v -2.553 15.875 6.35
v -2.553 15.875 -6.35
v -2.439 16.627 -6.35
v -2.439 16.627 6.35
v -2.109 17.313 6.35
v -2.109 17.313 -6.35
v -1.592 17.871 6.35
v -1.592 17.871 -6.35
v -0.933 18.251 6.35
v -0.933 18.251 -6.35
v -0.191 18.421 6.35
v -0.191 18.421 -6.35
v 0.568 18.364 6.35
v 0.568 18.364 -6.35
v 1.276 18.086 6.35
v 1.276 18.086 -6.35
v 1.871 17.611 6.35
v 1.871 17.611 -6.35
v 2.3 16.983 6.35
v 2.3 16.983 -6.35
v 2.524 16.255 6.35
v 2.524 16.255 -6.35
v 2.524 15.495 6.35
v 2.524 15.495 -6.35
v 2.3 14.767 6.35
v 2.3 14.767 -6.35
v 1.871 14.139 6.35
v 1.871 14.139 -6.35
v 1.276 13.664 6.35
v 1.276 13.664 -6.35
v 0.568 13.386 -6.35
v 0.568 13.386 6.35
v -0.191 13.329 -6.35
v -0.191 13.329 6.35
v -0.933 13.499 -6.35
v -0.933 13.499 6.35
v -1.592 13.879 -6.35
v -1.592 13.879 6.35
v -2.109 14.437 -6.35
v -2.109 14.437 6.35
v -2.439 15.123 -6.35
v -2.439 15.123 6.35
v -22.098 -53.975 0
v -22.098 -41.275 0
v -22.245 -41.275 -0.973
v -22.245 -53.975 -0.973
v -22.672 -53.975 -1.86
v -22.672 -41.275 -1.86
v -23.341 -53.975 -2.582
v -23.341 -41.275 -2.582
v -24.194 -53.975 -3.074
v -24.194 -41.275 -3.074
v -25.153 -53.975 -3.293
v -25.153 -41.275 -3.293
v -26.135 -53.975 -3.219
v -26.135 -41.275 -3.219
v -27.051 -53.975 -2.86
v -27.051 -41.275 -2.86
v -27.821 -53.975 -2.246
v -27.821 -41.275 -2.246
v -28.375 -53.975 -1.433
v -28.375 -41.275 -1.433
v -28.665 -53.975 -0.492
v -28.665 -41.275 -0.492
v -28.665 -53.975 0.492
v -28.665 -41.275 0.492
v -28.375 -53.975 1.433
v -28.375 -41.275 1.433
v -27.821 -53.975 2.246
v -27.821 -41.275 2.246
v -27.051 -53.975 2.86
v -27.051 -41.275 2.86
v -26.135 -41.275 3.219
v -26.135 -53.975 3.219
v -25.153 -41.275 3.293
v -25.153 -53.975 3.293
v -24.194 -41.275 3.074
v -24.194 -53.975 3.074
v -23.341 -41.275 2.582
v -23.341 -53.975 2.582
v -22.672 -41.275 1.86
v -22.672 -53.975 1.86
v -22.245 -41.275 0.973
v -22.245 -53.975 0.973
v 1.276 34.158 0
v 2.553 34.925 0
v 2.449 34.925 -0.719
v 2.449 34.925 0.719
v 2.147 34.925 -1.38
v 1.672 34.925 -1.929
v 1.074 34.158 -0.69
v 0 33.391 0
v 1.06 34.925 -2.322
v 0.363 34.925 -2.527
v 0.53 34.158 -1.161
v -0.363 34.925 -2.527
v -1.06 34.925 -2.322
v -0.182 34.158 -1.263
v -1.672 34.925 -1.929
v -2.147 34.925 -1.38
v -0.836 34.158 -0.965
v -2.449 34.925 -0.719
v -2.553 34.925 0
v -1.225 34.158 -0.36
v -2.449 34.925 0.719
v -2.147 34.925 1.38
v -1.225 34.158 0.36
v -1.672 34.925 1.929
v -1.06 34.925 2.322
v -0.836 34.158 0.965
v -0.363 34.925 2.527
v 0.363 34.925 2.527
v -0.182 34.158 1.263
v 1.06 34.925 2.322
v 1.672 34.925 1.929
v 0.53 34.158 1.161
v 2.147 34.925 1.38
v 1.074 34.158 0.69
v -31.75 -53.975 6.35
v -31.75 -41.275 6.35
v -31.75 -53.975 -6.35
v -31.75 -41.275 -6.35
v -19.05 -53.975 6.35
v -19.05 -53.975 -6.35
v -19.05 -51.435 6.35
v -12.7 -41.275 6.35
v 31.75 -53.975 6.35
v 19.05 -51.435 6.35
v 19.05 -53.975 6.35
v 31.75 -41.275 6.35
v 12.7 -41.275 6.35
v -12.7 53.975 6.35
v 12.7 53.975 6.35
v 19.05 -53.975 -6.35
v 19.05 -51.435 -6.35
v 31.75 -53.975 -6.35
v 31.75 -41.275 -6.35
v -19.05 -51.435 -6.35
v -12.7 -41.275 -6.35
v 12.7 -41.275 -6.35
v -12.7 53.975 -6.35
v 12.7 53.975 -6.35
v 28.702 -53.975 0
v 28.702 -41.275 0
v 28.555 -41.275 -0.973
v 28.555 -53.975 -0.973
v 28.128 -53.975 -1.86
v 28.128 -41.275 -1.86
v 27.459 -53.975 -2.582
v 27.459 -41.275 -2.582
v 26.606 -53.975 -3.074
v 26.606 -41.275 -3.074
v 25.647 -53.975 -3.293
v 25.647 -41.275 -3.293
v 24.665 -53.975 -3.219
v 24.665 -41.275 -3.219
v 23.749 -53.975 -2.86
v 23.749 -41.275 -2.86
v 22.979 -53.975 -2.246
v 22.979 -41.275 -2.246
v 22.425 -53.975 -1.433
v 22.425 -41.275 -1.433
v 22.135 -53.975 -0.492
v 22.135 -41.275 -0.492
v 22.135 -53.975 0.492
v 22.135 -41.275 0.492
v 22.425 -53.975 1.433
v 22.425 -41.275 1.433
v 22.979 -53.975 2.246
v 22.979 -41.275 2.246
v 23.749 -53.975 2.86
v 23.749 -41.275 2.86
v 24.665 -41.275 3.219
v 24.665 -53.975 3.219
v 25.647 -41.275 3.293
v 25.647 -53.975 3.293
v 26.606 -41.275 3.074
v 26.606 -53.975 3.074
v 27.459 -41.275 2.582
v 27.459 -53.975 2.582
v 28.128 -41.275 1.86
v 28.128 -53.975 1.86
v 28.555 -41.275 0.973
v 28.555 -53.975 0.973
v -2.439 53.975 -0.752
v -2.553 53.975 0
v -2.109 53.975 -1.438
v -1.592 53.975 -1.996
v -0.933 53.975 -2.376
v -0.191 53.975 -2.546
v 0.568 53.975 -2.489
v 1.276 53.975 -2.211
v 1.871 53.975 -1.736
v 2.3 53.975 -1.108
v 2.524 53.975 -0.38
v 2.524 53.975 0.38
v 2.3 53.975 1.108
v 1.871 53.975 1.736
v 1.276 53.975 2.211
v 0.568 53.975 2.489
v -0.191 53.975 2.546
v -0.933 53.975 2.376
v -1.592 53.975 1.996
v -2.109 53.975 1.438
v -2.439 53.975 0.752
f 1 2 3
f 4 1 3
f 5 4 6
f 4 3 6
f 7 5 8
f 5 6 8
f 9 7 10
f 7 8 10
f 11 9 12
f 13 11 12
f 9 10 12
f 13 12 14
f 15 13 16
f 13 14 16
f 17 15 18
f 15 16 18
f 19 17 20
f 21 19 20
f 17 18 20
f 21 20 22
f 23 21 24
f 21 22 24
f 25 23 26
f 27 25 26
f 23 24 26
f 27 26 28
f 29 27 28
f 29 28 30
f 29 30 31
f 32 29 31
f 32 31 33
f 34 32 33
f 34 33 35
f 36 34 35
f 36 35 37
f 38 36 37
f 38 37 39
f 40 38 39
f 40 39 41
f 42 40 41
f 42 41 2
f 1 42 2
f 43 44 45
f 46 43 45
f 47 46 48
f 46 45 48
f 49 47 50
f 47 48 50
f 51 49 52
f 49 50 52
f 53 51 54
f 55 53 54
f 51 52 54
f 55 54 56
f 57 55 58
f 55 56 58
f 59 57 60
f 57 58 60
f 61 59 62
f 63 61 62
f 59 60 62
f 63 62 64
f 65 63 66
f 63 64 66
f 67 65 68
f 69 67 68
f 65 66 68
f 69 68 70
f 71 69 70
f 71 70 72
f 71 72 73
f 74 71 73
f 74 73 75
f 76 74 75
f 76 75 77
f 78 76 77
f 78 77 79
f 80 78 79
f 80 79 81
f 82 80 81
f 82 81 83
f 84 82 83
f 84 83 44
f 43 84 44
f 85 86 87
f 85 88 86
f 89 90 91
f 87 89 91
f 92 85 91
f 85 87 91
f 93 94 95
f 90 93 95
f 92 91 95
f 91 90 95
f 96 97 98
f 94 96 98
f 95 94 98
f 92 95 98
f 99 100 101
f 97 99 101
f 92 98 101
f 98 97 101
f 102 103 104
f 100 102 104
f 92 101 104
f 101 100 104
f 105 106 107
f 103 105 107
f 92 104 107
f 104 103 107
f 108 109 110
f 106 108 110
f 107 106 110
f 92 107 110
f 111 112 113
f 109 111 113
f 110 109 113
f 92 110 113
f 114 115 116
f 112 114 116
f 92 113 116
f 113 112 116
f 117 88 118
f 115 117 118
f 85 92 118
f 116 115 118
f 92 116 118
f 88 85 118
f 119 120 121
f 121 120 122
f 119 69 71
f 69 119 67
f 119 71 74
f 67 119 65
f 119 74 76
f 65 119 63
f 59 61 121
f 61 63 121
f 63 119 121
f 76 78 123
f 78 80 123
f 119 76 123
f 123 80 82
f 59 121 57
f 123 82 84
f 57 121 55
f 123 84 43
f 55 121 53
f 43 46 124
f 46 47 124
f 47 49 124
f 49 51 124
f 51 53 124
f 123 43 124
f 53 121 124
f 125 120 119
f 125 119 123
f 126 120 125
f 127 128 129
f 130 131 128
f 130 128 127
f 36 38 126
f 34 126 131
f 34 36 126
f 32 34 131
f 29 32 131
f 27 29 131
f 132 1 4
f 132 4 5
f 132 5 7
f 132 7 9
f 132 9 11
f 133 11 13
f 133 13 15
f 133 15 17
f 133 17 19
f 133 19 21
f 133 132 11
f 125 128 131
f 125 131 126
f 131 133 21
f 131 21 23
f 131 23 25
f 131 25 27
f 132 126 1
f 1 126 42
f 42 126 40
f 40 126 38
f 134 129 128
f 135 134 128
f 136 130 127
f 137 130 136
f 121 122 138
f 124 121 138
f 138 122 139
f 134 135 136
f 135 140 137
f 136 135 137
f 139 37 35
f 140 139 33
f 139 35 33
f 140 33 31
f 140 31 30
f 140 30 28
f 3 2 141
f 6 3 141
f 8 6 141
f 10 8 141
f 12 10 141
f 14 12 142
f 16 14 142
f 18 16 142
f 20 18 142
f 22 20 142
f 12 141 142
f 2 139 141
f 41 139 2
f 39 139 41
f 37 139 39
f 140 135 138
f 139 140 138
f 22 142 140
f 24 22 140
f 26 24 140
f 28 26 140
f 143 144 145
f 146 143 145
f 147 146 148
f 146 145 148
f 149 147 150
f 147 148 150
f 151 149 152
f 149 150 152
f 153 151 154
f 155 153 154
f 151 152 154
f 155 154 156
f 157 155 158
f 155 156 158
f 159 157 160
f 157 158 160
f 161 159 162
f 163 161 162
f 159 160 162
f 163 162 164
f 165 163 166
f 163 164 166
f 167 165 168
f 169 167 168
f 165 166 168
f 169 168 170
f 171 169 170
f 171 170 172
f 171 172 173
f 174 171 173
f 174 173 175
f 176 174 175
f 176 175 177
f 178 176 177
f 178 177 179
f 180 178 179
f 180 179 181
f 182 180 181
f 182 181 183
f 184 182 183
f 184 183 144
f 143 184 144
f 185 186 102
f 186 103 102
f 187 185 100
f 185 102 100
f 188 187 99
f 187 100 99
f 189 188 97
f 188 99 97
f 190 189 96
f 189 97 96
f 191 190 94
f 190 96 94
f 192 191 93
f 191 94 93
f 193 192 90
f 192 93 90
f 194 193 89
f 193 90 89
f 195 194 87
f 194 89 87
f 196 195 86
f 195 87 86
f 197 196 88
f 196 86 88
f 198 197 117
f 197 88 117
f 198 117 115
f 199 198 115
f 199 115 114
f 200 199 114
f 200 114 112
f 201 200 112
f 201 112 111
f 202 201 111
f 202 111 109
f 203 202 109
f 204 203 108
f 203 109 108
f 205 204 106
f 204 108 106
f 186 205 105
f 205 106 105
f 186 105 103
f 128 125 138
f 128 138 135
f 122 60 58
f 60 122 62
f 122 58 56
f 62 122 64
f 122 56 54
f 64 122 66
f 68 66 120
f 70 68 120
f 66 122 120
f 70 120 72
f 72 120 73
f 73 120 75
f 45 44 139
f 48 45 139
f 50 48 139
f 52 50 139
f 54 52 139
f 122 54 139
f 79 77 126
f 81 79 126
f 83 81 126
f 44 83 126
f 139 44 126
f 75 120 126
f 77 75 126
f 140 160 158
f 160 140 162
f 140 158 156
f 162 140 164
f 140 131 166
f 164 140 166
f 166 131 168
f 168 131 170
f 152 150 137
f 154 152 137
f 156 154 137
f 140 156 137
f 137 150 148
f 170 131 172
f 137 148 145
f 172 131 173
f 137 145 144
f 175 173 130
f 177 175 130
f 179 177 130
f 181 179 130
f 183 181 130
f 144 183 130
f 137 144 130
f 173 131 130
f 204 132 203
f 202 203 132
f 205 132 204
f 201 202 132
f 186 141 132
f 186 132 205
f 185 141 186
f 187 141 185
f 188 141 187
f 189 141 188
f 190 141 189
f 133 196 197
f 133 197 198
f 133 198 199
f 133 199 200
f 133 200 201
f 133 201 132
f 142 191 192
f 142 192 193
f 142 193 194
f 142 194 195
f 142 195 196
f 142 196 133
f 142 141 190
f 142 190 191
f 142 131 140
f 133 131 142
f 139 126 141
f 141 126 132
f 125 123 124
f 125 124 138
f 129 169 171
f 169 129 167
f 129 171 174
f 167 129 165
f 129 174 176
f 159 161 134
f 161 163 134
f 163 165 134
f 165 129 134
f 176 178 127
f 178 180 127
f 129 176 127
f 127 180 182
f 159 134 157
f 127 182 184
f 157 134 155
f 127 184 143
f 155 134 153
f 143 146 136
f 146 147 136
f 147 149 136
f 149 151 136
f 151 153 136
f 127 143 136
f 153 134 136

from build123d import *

# Parameters (mm, degrees)
SKETCH1_W                   = 63.5
SKETCH1_H                   = 12.7
BOSS_EXTRUDE1_DEPTH         = 53.975
CUT_EXTRUDE1_REACH          = 14.7
SKETCH2_W                   = 19.05
SKETCH2_H                   = 95.25
SKETCH3_R                   = 3.302
CUT_EXTRUDE2_DEPTH          = 13.7
F_1_4_20_TAPPED_HOLE1_D     = 5.1054
F_1_4_20_TAPPED_HOLE1_DEPTH = 19.05
F_1_4_20_TAPPED_HOLE1_TIP   = 1.533816902
SKETCH6_W                   = 38.1
SKETCH6_H                   = 2.54
CUT_EXTRUDE3_DEPTH          = 13.7
F_1_4_20_TAPPED_HOLE2_D     = 5.1054
F_1_4_20_TAPPED_HOLE2_DEPTH = 25.4
F_1_4_20_TAPPED_HOLE2_TIP   = 1.533816902


with BuildPart() as part:
    # Sketch1 → Boss-Extrude1 (new body, symmetric)
    with BuildSketch(Plane(origin=(0, 0, 0), x_dir=(1, 0, 0), z_dir=(0, 1, 0))):
        Rectangle(SKETCH1_W, SKETCH1_H)
    extrude(amount=BOSS_EXTRUDE1_DEPTH, both=True)

    # Sketch2 → Cut-Extrude1 (cut, up to next)
    with BuildSketch(Plane.XY.offset(6.35), mode=Mode.PRIVATE) as cut_extrude1_sk1:
        with Locations((-22.225, 6.35)):
            Rectangle(SKETCH2_W, SKETCH2_H)
    cut_extrude1_tool1 = extrude(cut_extrude1_sk1.sketch, amount=-CUT_EXTRUDE1_REACH, mode=Mode.PRIVATE) & part.part
    add(cut_extrude1_tool1.solids().sort_by_distance((-22.225, 6.35, 6.35))[0], mode=Mode.SUBTRACT)
    # Sketch2 → Cut-Extrude1 (cut, up to next)
    with BuildSketch(Plane.XY.offset(6.35), mode=Mode.PRIVATE) as cut_extrude1_sk2:
        with Locations((22.225, 6.35)):
            Rectangle(SKETCH2_W, SKETCH2_H)
    cut_extrude1_tool2 = extrude(cut_extrude1_sk2.sketch, amount=-CUT_EXTRUDE1_REACH, mode=Mode.PRIVATE) & part.part
    add(cut_extrude1_tool2.solids().sort_by_distance((22.225, 6.35, 6.35))[0], mode=Mode.SUBTRACT)

    # Sketch3 → Cut-Extrude2 (cut, through all)
    with BuildSketch(Plane(origin=(0, -41.275, 0), x_dir=(1, 0, 0), z_dir=(0, 1, 0))):
        with Locations((-25.4, 0)):
            Circle(SKETCH3_R)
        with Locations((25.4, 0)):
            Circle(SKETCH3_R)
    extrude(amount=-CUT_EXTRUDE2_DEPTH, mode=Mode.SUBTRACT)

    # 1/4-20 Tapped Hole1
    with Locations(Plane(origin=(0, 53.975, 0), x_dir=(1, 0, 0), z_dir=(0, 1, 0))):
        with Locations((0, 0)):
            Hole(F_1_4_20_TAPPED_HOLE1_D / 2, depth=F_1_4_20_TAPPED_HOLE1_DEPTH)
            with Locations((0, 0, -(F_1_4_20_TAPPED_HOLE1_DEPTH + F_1_4_20_TAPPED_HOLE1_TIP / 2))):  # 118° drill point
                Cone(0, F_1_4_20_TAPPED_HOLE1_D / 2, F_1_4_20_TAPPED_HOLE1_TIP, mode=Mode.SUBTRACT)

    # Sketch6 → Cut-Extrude3 (cut, through all)
    with BuildSketch(Plane.XY.offset(6.35)):
        with Locations((0, -52.705)):
            Rectangle(SKETCH6_W, SKETCH6_H)
    extrude(amount=-CUT_EXTRUDE3_DEPTH, mode=Mode.SUBTRACT)

    # 1/4-20 Tapped Hole2
    with Locations(Plane.XY.offset(6.35)):
        with Locations((0, 15.875)):
            Hole(F_1_4_20_TAPPED_HOLE2_D / 2, depth=F_1_4_20_TAPPED_HOLE2_DEPTH)
            with Locations((0, 0, -(F_1_4_20_TAPPED_HOLE2_DEPTH + F_1_4_20_TAPPED_HOLE2_TIP / 2))):  # 118° drill point
                Cone(0, F_1_4_20_TAPPED_HOLE2_D / 2, F_1_4_20_TAPPED_HOLE2_TIP, mode=Mode.SUBTRACT)


solid = part.part
